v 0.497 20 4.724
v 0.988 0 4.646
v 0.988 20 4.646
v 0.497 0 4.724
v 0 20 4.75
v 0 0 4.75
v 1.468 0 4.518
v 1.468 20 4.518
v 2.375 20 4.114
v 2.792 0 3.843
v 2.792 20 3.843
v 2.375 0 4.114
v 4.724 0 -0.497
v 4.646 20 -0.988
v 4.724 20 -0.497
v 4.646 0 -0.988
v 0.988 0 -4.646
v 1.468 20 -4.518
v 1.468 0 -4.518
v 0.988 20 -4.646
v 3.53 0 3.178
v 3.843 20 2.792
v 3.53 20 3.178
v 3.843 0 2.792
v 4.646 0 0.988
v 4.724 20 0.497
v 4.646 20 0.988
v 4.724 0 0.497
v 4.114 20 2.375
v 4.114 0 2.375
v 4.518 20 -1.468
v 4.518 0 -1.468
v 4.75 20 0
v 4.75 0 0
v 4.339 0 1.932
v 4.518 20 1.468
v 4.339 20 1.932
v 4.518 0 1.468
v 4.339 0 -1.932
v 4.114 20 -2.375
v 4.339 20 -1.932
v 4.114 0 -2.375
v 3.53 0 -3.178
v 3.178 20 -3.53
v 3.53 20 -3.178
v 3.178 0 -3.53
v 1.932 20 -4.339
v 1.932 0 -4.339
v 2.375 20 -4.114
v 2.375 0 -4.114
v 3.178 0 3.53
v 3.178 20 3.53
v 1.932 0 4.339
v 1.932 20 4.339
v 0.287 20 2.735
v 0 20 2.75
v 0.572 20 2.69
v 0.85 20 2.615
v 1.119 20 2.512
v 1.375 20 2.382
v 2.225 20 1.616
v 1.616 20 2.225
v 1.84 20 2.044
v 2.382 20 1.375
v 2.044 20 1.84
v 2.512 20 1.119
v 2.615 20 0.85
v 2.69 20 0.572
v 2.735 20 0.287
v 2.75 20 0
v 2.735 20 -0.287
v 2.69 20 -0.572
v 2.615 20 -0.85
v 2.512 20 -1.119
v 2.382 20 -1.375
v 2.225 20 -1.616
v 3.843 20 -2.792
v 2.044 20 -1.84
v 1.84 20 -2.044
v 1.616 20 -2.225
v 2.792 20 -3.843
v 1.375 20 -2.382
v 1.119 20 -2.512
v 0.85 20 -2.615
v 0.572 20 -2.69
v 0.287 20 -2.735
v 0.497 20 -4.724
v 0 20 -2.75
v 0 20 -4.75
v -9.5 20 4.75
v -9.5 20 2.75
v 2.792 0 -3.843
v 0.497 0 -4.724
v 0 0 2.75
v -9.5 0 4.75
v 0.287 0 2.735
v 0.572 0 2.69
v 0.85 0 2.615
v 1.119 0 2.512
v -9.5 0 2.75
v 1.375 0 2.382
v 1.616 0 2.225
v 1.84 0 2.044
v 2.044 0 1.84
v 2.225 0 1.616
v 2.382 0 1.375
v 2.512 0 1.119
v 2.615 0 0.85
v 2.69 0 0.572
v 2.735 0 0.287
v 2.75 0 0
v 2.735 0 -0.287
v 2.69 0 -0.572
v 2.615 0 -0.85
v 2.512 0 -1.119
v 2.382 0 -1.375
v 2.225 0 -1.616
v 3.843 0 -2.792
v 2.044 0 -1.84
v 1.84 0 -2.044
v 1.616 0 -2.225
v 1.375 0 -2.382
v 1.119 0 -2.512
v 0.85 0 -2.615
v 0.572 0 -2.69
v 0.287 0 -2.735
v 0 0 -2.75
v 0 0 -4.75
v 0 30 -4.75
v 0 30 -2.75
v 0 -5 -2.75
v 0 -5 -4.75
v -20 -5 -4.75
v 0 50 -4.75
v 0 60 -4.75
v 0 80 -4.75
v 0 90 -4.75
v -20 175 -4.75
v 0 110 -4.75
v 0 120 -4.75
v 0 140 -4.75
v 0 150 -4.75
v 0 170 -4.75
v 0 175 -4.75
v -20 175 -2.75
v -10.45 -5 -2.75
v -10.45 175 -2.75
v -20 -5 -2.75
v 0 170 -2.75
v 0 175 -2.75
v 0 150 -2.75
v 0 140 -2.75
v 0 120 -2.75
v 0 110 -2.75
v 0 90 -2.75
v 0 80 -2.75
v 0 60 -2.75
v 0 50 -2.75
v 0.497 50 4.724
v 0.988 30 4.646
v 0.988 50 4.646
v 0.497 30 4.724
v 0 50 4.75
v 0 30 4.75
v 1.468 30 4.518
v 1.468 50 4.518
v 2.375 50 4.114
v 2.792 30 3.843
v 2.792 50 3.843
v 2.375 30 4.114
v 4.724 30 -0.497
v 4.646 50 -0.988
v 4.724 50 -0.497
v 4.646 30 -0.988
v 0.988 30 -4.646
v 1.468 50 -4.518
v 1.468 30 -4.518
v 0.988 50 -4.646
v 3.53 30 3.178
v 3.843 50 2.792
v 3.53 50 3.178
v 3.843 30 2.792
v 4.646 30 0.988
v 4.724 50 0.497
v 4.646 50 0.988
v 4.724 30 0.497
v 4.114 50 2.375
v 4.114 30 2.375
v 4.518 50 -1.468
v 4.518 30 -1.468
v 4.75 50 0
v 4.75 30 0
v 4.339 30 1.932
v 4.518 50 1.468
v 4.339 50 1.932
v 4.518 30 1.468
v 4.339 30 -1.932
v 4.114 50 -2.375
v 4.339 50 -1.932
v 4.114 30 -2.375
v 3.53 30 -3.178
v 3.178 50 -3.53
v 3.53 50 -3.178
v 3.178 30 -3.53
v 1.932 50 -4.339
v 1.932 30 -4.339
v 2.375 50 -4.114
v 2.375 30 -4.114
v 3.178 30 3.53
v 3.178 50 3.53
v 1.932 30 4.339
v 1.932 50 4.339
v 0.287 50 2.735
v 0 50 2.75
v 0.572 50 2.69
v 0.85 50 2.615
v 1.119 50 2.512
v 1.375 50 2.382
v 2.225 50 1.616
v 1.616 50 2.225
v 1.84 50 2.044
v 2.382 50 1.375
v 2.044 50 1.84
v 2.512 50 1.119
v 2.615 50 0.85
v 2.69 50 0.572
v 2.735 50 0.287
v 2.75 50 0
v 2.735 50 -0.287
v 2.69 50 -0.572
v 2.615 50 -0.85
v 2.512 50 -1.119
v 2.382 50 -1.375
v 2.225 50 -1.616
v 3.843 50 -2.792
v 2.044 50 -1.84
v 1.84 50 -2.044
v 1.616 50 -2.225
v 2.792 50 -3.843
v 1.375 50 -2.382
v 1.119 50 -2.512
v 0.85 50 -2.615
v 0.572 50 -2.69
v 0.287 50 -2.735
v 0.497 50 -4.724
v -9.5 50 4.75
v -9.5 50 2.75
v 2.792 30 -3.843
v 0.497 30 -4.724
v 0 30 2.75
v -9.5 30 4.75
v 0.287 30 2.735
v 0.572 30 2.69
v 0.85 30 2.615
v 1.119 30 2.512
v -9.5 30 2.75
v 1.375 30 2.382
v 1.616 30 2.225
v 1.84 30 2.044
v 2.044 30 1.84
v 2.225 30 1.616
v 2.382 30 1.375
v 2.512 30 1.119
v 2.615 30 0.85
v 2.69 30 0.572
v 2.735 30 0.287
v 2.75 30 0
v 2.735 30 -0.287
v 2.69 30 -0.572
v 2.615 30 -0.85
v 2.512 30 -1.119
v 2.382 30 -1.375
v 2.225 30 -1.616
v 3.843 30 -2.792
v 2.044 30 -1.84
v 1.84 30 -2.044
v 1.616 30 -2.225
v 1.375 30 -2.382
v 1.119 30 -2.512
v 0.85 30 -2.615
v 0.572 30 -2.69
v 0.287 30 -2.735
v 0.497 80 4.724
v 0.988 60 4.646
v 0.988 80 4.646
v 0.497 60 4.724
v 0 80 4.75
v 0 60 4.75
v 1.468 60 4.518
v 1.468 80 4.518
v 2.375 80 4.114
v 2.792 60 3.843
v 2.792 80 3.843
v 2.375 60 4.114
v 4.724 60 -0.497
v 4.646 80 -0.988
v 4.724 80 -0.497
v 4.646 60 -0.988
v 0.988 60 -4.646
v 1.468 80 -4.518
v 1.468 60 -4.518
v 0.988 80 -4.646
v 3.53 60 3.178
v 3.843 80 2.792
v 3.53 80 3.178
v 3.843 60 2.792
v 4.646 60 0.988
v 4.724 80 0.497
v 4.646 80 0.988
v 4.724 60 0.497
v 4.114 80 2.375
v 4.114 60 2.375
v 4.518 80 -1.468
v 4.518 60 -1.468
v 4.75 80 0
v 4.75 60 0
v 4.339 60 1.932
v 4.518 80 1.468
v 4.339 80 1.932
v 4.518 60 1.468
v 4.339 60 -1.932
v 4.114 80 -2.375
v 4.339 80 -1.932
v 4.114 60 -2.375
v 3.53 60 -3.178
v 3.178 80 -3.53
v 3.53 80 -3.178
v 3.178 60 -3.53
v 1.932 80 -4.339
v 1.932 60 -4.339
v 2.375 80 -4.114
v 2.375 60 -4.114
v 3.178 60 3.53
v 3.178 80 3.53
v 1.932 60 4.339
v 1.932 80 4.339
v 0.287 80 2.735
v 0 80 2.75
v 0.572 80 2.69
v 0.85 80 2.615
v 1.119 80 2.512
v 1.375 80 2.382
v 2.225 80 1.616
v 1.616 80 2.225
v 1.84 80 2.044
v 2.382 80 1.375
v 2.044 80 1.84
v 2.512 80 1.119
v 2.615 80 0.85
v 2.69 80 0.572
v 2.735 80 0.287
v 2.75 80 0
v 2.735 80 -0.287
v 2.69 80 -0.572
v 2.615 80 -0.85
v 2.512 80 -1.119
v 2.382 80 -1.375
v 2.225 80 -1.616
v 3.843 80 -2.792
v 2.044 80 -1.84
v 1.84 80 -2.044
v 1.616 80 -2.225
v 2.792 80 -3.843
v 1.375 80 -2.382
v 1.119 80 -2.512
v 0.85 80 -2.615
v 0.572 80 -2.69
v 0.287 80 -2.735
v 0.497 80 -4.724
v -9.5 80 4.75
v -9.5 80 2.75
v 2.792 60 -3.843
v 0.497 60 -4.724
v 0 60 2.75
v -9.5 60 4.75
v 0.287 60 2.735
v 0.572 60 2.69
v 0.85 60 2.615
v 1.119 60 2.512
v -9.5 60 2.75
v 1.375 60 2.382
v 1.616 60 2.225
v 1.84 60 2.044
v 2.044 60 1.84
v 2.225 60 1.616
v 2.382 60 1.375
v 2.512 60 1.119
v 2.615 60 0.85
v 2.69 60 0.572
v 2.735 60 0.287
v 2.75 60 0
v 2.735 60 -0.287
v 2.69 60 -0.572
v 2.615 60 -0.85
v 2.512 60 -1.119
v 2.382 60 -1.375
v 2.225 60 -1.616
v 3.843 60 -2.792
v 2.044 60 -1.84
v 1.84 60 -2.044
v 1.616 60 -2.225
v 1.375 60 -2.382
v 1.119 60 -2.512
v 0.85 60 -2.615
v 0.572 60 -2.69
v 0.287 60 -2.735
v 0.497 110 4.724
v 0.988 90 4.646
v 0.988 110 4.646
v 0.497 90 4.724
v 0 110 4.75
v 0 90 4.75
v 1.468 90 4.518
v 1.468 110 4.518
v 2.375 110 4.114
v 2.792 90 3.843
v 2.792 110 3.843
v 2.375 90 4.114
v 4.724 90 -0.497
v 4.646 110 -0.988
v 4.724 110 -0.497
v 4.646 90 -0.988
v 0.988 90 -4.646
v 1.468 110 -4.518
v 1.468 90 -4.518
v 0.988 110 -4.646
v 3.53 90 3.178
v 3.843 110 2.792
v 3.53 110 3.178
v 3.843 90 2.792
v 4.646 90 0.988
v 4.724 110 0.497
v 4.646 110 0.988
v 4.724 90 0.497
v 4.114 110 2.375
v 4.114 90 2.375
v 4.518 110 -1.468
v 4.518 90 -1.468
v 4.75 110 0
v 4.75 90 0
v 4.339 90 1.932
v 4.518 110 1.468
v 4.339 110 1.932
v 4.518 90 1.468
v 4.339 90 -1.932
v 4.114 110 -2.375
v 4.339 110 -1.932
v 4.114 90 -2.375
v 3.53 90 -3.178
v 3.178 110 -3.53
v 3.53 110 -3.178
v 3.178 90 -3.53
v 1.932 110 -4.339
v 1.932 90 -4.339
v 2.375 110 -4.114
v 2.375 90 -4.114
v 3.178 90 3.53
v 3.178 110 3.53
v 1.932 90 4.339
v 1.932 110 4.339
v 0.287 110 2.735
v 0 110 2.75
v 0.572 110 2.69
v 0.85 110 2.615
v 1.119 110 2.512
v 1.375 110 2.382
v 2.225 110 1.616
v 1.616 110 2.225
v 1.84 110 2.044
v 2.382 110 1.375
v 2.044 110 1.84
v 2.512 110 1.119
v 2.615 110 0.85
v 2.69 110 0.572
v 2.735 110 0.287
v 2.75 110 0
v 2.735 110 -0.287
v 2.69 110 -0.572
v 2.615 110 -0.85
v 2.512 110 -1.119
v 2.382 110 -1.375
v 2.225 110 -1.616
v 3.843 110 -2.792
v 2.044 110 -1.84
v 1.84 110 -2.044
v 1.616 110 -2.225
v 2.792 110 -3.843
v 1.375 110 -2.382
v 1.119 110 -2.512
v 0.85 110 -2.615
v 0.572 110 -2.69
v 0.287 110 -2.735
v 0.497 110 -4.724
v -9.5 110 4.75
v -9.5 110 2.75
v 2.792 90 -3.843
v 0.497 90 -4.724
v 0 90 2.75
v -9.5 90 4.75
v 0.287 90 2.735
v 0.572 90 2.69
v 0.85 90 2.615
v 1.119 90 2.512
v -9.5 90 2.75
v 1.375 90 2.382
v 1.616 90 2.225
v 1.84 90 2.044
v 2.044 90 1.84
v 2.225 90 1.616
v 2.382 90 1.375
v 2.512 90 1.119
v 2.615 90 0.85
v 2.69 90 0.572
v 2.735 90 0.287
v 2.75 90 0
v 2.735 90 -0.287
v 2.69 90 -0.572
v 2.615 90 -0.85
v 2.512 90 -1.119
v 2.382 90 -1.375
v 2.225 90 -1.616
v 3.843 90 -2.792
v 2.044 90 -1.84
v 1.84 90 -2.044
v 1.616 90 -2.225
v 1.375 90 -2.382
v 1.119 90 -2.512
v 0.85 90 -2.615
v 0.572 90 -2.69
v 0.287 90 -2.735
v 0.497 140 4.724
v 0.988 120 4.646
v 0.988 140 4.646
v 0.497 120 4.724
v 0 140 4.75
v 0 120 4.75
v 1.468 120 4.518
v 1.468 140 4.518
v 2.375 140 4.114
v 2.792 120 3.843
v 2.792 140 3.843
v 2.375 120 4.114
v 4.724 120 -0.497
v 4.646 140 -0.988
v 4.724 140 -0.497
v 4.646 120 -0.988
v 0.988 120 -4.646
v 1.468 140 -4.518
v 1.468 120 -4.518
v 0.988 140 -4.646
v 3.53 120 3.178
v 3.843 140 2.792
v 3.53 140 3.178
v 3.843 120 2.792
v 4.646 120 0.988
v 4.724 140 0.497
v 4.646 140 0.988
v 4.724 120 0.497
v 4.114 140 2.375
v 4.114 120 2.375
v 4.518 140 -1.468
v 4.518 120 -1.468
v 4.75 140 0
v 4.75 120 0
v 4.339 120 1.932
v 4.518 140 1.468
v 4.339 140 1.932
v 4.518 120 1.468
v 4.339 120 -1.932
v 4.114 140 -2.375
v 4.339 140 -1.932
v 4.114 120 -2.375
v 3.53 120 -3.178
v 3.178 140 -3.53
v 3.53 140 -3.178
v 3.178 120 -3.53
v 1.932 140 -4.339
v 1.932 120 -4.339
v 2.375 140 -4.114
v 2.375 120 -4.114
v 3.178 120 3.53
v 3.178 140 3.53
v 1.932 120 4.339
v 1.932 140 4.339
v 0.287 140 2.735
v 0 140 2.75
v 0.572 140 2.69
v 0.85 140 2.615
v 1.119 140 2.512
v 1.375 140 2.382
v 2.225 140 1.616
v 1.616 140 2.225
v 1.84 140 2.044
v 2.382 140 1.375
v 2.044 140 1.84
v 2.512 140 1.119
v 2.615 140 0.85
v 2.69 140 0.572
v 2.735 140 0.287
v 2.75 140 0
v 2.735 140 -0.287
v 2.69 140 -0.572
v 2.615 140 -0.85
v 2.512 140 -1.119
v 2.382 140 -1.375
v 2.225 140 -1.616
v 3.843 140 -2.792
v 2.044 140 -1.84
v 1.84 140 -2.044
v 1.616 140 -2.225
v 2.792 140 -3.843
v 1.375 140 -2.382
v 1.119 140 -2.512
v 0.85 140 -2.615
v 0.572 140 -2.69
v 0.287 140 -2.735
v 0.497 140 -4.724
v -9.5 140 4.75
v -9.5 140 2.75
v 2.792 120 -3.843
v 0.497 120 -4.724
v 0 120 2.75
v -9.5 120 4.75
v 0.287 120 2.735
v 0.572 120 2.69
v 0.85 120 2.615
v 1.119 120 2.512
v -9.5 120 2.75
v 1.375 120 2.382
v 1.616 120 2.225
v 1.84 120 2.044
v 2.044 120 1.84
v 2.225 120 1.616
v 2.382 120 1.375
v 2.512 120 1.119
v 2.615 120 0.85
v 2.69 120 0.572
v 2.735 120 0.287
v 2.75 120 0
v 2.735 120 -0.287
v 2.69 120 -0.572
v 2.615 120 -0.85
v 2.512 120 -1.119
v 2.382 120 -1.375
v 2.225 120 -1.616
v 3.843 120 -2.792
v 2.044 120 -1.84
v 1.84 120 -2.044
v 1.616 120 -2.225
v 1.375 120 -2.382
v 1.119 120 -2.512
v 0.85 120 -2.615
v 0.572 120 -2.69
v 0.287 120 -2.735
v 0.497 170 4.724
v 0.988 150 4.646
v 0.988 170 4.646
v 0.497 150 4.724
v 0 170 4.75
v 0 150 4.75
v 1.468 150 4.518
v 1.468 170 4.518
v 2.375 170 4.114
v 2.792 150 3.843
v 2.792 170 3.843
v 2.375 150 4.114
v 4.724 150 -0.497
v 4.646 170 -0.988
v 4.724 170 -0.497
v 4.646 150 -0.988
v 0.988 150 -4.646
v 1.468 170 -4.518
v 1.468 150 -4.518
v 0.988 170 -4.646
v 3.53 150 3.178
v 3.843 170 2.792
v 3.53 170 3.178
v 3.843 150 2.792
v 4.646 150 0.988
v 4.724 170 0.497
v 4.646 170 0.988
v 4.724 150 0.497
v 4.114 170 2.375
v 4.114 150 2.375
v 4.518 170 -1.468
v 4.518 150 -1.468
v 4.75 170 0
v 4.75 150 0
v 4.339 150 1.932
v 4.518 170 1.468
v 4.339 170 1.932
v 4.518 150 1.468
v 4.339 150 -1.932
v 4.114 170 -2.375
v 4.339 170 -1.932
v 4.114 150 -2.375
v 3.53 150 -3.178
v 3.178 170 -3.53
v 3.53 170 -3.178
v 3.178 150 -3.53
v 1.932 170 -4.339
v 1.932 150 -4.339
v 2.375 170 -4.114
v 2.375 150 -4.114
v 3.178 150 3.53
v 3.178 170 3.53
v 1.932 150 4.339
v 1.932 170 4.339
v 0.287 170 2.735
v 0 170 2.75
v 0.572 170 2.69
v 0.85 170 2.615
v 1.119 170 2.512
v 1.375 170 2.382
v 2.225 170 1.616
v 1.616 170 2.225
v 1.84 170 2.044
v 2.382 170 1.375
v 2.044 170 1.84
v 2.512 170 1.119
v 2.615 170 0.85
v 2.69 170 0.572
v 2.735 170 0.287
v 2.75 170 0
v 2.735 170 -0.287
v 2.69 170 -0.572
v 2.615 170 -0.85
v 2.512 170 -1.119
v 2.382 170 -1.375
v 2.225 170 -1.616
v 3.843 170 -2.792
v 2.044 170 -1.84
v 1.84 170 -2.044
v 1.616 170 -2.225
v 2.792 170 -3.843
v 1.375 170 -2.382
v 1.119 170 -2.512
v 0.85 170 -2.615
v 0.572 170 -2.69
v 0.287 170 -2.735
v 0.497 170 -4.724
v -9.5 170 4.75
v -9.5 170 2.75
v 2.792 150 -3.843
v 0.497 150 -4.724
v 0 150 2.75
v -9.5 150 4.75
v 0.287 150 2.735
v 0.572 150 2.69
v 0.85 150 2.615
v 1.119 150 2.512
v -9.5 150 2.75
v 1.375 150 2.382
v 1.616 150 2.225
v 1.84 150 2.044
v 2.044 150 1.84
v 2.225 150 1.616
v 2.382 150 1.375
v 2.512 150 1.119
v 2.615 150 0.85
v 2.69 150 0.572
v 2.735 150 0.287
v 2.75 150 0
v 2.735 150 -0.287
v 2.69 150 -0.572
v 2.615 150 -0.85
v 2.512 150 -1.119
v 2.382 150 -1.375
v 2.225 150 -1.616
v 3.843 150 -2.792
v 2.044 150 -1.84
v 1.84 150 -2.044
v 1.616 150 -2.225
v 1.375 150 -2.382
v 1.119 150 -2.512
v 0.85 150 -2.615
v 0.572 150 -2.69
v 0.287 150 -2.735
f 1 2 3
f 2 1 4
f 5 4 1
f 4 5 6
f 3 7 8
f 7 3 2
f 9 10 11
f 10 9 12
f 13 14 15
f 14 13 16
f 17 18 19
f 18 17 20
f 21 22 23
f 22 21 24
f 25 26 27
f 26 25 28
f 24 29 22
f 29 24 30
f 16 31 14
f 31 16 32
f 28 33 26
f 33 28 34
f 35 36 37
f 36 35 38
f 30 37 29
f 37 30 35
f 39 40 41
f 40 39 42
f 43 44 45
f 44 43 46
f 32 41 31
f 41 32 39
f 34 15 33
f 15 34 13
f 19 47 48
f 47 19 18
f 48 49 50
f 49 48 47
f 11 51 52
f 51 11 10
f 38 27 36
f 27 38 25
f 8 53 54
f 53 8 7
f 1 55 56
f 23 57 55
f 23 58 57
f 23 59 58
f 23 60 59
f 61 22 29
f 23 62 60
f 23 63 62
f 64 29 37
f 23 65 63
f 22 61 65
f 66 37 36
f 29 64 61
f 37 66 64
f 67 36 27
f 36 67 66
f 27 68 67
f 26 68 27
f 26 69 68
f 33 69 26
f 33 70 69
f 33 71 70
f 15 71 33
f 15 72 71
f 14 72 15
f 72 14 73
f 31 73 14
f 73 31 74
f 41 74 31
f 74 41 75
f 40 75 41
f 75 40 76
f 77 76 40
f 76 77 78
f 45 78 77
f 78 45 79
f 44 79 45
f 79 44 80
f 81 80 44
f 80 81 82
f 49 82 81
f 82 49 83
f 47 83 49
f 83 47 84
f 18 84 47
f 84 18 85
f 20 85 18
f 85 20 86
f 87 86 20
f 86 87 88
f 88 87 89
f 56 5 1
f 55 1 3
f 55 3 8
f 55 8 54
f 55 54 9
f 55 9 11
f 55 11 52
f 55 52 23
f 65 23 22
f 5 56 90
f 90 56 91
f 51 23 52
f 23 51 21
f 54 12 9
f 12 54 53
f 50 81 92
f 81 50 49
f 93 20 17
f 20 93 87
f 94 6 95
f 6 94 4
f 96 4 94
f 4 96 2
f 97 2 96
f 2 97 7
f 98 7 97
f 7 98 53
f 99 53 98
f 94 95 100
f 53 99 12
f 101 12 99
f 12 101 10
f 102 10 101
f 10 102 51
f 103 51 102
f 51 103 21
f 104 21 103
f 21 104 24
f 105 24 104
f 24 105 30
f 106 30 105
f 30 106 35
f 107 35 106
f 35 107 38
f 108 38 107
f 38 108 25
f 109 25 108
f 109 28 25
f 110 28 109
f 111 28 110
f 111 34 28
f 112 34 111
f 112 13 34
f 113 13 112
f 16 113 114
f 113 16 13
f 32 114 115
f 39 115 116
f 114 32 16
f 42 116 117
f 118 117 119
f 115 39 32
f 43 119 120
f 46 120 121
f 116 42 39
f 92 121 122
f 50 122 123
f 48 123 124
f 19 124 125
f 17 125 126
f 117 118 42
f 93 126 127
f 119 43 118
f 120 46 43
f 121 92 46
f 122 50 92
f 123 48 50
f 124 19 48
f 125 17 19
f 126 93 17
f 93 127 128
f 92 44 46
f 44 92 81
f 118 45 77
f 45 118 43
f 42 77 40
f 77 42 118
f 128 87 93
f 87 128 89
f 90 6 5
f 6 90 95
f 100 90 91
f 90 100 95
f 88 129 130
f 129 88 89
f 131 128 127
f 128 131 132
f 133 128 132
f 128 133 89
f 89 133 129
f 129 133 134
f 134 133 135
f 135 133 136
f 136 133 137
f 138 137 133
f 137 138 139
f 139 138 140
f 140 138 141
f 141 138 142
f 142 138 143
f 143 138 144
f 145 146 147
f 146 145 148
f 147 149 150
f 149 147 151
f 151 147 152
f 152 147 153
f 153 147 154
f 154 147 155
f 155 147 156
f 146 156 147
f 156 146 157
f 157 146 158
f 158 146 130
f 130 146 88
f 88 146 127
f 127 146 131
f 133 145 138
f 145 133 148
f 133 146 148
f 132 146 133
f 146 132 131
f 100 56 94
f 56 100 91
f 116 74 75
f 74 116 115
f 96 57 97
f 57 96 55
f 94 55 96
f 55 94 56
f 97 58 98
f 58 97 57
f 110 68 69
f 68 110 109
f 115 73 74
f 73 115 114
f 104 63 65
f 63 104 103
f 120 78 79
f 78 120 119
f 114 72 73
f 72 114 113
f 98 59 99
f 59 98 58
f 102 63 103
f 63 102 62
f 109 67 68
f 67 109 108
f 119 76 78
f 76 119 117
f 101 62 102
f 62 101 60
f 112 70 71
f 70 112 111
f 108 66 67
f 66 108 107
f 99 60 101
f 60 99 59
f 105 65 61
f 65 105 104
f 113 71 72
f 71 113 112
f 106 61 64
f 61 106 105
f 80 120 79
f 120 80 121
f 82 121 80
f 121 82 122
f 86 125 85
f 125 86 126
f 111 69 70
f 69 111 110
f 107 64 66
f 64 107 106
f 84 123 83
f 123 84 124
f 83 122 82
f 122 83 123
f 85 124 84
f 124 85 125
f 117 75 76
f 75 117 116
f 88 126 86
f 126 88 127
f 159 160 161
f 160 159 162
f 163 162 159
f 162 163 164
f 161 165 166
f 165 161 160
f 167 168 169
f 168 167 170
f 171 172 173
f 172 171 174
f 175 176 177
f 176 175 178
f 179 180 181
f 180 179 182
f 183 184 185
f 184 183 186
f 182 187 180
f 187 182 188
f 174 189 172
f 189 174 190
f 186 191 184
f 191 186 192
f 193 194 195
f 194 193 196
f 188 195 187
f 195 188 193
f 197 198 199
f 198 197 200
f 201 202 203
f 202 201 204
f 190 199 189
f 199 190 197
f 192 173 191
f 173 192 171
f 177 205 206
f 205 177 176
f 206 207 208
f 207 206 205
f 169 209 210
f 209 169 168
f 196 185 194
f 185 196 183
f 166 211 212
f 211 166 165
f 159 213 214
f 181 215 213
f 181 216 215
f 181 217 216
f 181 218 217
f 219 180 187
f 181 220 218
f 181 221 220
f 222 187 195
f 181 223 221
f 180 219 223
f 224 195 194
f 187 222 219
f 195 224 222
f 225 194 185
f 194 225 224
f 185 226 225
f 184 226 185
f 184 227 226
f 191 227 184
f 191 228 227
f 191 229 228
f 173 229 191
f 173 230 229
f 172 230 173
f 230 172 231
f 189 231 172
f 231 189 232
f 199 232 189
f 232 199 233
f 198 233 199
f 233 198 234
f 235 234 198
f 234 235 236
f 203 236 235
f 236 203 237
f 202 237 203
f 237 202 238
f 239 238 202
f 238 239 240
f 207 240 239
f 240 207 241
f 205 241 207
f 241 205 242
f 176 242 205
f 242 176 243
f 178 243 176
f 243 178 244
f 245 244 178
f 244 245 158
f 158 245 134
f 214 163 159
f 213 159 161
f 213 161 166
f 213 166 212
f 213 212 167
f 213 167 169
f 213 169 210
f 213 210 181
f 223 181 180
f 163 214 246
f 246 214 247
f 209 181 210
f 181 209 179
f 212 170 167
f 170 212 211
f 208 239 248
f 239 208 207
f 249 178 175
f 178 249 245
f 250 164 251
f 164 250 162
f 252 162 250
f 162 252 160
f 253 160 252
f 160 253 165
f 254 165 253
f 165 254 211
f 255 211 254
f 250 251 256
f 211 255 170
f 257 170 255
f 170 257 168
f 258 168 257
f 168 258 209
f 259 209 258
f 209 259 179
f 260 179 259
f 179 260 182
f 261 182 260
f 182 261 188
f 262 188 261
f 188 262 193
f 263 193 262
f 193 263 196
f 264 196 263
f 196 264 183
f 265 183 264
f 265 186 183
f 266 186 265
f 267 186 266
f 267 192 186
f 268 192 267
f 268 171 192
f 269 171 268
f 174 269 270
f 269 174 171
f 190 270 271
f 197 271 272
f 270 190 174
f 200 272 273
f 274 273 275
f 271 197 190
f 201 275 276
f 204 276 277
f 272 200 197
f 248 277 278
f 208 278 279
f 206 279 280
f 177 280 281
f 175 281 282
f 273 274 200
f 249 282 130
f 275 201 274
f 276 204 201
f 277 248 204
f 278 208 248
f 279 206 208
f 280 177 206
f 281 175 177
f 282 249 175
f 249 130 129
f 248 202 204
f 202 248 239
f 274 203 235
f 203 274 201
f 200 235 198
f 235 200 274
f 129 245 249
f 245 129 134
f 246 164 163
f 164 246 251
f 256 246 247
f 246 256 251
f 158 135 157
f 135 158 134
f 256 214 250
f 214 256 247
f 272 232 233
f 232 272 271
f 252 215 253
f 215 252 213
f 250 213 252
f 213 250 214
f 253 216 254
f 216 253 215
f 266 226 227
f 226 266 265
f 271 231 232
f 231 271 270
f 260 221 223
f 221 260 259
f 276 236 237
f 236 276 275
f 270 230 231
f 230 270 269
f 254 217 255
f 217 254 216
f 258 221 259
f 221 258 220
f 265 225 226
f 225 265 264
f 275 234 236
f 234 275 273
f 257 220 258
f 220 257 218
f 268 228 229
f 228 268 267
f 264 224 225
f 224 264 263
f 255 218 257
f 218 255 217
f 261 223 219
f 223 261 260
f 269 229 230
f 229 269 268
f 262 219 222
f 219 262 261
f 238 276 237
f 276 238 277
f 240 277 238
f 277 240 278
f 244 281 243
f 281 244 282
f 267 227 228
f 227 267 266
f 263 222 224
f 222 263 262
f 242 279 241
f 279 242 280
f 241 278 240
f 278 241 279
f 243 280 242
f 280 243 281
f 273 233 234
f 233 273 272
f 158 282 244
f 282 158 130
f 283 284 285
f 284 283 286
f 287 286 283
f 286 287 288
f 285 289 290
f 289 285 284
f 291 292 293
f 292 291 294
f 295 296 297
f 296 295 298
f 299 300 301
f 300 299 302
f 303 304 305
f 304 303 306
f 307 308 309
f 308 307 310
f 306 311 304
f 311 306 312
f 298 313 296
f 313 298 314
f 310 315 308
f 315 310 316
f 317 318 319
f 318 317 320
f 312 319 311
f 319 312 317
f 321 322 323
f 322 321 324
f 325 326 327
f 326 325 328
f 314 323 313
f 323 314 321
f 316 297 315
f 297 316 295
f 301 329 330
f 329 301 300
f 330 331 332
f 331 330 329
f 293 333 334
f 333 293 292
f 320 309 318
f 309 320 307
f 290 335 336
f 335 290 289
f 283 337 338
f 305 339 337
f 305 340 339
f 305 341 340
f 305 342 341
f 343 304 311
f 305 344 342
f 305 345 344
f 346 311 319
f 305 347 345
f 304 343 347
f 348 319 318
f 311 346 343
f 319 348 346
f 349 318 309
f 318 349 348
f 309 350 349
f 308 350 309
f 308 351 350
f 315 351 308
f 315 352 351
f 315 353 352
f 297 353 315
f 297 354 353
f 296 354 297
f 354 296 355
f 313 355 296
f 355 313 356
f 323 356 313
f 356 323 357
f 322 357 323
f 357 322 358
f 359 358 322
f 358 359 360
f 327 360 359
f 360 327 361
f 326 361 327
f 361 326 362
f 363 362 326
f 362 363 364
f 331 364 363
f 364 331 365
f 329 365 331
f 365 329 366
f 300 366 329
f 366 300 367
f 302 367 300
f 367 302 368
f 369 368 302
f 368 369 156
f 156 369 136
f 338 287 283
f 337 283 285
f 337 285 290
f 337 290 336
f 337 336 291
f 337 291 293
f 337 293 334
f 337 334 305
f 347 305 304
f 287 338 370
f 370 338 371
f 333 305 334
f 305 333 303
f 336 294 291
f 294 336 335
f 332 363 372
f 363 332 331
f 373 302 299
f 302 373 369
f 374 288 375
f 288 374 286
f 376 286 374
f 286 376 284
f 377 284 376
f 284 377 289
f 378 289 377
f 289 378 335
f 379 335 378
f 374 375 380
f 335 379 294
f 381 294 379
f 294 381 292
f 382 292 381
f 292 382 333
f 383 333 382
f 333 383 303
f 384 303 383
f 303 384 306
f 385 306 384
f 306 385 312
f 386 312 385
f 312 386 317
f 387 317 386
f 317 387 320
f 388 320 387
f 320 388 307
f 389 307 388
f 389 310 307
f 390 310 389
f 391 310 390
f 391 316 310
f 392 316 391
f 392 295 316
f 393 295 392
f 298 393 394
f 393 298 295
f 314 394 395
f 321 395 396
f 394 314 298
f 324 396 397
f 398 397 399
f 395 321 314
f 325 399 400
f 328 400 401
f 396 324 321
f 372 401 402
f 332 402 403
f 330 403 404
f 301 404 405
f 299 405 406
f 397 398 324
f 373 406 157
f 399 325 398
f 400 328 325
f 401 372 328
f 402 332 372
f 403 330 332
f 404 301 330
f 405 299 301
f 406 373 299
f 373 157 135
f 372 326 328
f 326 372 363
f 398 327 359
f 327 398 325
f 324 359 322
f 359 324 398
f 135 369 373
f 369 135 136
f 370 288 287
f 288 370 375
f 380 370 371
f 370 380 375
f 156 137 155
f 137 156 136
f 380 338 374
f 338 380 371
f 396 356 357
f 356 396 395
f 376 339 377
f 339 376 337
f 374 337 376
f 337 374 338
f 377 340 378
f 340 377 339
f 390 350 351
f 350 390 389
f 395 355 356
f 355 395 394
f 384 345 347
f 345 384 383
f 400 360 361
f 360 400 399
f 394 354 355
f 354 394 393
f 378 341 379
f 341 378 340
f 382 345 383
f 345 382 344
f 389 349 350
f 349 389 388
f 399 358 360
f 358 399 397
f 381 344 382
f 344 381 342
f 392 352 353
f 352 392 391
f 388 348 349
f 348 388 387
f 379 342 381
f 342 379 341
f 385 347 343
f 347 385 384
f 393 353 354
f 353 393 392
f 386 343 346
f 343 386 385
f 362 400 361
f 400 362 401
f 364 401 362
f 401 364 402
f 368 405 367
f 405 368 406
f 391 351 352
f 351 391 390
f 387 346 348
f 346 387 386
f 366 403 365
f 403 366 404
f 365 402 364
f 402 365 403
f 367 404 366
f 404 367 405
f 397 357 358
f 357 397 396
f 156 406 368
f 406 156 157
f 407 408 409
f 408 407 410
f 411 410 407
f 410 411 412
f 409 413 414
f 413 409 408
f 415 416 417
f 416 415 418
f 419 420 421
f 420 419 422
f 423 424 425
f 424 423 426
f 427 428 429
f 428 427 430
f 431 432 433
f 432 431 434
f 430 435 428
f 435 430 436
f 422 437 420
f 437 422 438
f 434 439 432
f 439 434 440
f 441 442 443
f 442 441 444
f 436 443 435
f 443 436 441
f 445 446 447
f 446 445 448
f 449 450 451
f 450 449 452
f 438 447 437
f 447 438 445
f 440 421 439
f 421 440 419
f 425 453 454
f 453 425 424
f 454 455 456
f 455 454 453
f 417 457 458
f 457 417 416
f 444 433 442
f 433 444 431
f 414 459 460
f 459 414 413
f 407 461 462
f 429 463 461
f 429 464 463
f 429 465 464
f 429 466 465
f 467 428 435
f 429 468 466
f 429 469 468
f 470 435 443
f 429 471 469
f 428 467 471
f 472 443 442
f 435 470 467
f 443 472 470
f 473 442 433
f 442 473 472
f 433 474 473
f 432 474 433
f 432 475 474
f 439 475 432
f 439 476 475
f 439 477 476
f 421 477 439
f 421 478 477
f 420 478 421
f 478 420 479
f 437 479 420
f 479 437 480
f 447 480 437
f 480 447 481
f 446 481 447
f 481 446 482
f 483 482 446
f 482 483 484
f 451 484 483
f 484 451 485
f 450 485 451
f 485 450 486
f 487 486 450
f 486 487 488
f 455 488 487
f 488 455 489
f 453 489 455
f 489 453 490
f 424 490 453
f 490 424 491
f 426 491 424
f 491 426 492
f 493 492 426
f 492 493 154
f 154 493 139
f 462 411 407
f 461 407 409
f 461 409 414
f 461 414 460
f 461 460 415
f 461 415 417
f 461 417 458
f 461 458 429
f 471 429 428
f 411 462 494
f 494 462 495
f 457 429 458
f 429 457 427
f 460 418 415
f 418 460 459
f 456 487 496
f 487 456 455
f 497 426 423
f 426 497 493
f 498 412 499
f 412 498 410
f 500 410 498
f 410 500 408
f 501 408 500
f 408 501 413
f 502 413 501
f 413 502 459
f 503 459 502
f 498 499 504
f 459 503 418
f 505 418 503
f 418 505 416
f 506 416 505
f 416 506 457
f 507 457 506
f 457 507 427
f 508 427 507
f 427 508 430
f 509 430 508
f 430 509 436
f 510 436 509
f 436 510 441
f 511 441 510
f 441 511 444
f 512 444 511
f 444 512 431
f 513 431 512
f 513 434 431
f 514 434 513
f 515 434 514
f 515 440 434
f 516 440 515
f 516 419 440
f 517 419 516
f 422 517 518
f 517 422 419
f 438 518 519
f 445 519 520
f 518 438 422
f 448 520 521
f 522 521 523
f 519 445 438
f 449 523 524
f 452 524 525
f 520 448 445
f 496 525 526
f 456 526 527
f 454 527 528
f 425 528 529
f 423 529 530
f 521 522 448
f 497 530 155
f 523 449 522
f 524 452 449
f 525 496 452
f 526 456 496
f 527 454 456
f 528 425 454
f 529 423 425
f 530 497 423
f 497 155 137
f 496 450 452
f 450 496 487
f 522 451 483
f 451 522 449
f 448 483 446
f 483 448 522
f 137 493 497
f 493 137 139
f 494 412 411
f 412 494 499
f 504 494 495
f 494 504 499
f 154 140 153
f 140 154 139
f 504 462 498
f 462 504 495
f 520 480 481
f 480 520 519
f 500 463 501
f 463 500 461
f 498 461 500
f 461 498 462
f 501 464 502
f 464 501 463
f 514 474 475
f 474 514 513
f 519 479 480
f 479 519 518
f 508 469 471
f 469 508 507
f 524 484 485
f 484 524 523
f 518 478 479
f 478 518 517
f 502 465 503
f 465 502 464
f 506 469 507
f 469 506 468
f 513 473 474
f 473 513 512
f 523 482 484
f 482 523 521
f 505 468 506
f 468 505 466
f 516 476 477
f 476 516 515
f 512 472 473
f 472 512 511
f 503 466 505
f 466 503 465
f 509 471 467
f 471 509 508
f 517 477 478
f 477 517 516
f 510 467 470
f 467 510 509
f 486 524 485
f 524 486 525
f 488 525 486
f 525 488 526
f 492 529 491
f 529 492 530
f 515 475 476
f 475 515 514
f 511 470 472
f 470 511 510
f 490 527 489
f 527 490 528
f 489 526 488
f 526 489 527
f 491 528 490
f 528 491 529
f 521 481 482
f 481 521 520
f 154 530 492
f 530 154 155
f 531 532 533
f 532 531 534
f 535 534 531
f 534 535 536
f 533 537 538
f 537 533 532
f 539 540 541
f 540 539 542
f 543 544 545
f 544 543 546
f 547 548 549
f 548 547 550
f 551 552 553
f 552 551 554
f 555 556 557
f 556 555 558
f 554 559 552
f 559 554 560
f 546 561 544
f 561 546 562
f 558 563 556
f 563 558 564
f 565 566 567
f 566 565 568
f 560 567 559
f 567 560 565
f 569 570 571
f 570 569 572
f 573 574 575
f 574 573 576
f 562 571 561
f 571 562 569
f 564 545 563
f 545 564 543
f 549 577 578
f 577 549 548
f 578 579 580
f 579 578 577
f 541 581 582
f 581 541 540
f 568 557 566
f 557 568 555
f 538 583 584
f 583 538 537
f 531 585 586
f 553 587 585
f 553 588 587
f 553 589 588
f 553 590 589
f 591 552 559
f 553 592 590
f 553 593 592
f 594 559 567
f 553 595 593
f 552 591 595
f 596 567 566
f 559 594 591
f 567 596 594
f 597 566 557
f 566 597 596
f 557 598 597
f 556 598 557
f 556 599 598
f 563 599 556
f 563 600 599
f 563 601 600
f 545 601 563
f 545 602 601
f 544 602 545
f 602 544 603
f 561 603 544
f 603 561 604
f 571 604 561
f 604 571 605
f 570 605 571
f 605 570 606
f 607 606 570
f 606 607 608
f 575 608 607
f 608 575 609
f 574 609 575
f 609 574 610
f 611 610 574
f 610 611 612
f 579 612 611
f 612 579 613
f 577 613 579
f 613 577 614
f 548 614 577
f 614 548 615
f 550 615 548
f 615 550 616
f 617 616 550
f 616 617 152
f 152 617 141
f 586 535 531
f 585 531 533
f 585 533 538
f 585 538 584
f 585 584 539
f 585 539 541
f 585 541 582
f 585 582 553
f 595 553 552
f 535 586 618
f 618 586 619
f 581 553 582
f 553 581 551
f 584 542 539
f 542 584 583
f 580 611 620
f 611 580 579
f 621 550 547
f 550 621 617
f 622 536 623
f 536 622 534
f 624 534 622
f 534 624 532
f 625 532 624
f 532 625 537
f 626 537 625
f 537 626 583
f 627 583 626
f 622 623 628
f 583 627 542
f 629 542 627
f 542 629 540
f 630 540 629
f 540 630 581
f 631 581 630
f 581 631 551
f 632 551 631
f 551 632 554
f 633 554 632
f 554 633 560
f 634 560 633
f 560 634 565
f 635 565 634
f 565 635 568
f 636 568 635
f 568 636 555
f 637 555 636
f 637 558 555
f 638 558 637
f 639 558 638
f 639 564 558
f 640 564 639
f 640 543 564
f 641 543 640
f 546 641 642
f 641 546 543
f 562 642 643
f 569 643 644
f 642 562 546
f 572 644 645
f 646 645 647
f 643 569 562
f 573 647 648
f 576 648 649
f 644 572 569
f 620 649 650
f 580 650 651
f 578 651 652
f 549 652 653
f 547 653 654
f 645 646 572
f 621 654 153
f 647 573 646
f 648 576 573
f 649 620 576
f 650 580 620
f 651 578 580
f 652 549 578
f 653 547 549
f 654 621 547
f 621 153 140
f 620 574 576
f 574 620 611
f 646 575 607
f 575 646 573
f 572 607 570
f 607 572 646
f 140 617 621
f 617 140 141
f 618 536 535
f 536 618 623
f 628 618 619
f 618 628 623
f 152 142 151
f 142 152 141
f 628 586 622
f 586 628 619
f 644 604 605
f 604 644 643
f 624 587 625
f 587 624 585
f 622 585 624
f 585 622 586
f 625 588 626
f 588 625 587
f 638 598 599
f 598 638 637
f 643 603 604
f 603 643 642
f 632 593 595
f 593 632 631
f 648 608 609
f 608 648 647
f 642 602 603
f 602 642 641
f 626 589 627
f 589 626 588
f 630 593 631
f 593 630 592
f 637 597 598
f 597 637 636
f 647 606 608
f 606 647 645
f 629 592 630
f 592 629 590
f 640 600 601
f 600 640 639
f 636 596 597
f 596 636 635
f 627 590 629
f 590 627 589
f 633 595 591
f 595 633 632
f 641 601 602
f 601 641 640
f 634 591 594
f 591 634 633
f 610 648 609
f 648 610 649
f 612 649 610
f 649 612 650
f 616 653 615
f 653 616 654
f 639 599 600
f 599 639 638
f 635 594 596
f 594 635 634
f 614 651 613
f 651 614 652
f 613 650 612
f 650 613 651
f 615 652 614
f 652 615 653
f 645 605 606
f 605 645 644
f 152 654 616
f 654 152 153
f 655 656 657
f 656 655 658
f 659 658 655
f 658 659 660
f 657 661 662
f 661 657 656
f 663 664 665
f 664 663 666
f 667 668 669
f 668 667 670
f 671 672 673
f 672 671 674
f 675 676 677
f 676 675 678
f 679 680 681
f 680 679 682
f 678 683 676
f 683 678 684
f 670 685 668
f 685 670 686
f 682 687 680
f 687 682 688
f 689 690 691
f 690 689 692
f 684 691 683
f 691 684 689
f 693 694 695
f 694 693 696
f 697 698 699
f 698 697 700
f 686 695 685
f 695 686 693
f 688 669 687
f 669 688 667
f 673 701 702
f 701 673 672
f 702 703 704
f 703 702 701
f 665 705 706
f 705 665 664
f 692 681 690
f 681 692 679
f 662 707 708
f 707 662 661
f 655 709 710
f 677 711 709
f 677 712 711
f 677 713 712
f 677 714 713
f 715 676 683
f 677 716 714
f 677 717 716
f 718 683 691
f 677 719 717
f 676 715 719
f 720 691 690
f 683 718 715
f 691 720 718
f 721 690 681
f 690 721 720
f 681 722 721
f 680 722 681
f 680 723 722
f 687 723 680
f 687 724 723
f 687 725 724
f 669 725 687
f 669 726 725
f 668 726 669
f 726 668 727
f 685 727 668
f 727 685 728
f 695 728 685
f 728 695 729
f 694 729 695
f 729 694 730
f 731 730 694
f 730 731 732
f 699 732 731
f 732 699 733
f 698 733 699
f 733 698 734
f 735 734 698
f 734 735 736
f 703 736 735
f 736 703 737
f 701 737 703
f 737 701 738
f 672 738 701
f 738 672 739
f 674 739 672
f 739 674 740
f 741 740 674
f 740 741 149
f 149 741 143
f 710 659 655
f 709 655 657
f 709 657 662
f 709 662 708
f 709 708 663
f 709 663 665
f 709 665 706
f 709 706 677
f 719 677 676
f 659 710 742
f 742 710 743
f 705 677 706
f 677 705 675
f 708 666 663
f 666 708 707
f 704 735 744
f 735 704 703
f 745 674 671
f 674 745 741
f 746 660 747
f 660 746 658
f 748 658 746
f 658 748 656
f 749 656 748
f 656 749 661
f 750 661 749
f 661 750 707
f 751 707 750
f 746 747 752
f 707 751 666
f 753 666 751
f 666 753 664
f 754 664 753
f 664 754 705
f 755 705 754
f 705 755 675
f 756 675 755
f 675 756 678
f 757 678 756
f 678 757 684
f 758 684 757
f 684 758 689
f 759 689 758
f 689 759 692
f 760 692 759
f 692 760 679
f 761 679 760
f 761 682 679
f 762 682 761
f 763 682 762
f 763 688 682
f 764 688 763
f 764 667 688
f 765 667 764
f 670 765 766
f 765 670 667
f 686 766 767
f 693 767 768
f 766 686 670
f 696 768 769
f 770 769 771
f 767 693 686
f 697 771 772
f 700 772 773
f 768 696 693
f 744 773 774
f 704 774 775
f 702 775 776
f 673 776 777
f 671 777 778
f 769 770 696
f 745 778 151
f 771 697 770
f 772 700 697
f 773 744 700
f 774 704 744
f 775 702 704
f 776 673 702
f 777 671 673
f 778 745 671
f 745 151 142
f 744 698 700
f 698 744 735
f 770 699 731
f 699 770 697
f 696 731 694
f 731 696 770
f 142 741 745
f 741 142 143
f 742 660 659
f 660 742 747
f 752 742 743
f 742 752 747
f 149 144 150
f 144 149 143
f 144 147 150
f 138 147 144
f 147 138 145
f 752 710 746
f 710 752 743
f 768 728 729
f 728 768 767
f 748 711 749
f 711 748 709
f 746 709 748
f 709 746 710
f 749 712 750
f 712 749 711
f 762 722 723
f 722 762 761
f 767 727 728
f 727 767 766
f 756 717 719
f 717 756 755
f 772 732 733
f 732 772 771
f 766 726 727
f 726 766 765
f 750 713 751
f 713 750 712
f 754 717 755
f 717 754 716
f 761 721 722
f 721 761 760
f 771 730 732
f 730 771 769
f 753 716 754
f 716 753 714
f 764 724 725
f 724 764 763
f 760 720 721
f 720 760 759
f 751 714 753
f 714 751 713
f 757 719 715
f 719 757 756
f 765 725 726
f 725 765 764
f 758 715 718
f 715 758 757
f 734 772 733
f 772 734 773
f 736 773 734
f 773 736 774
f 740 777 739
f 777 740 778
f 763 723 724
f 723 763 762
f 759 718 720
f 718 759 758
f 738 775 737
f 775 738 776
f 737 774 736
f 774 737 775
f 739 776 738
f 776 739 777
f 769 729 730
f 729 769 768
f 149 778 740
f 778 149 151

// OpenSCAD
/*
    ophangen van hondenrekje
    
*/

tussen = 30;
hoogte = 20;
draad = 10;
hangDraad = 5.5;
aantal = 6;
wall = 2;
naam = "Dexter";
$fn = 60;

rotate([0, -90, 0])
haken();

module haken() {
    for(i=[0:aantal - 1]) {
        translate([0, tussen * i, 0]) haak();
    } 
}

module haak() {
    d = hangDraad + 2 * wall;
    h = tussen - draad;    
    difference() {
        union() {
            rotate([-90, 0, 0])
                cylinder(d = d, h = h);
            translate([-d / 2, 0, 0]) 
                cube([d, h, d]);
            translate([-d / 2, -draad / 2, 0])
                cube([wall, tussen, hoogte]); 
        }
        translate([wall - d / 2 , -draad / 2, 0])
            cube([hangDraad, tussen * 1.1, d * 1.1]); 
        translate([0, -draad / 2, 0])
            rotate([-90, 0, 0])
                cylinder(d = hangDraad, h = tussen);
    }
}
